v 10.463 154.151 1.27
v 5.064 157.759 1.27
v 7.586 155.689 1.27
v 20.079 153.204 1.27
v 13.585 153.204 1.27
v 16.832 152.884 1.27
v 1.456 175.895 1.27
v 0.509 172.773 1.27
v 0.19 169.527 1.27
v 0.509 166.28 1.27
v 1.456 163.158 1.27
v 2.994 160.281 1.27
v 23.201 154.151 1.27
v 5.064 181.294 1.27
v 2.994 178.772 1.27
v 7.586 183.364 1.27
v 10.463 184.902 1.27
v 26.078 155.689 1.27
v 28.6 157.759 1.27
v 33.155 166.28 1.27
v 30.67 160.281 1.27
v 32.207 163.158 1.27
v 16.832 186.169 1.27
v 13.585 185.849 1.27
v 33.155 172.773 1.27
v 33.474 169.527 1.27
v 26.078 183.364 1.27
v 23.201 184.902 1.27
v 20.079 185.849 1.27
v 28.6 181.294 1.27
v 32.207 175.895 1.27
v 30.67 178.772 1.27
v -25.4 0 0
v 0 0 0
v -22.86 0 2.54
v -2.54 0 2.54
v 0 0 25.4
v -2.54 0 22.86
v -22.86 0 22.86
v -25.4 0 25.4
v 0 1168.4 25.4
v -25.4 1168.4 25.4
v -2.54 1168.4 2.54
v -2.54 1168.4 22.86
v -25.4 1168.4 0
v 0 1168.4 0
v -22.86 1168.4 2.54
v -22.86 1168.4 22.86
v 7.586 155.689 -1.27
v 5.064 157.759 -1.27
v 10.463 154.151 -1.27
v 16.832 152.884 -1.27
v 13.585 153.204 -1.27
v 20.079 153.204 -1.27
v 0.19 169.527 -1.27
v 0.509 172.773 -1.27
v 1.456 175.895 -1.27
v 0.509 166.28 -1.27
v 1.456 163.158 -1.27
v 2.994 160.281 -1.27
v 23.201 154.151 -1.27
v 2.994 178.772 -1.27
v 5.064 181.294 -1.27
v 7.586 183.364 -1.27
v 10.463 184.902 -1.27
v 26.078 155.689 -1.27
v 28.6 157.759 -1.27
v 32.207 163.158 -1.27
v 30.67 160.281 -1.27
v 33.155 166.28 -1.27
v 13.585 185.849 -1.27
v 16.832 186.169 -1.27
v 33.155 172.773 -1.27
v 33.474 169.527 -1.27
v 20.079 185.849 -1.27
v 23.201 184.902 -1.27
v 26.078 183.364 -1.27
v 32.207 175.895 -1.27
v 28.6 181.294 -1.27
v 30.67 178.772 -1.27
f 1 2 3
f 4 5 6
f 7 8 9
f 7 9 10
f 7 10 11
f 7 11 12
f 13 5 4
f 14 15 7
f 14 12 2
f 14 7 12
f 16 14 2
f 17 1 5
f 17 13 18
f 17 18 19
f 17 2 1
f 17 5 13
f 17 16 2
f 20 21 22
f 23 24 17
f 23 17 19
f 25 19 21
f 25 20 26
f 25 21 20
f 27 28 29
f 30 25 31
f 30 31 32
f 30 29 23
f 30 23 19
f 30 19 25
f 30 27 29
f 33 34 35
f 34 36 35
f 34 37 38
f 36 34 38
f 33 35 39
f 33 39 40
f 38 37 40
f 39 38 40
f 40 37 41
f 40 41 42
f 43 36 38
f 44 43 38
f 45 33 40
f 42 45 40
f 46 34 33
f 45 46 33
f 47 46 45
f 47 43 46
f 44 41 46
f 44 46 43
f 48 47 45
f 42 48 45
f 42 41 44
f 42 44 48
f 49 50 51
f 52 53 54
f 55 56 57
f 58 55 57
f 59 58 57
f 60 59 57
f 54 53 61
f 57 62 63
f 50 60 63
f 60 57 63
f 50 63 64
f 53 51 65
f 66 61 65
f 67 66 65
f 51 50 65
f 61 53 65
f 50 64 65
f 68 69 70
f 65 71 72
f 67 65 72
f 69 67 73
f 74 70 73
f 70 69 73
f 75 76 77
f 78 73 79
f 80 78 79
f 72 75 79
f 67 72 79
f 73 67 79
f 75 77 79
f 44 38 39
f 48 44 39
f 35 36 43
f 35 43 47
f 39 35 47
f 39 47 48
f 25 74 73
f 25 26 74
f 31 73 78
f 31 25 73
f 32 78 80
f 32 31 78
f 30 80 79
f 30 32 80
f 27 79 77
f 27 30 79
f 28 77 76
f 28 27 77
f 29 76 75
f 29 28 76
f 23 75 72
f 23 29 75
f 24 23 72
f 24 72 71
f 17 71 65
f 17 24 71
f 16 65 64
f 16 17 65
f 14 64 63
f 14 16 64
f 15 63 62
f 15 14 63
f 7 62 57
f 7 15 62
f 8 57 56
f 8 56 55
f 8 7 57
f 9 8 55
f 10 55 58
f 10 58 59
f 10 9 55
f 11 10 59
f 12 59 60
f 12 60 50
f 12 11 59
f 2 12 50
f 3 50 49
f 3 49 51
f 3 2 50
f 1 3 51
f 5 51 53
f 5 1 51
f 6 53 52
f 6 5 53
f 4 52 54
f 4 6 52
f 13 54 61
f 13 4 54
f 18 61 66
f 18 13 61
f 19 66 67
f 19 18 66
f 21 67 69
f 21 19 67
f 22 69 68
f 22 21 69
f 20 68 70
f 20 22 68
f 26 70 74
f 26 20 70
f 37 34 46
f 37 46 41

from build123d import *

# Parameters (mm, degrees)
SKETCH1_W                 = 25.4
SKETCH1_H                 = 25.4
SKETCH1_W_2               = 20.32
SKETCH1_H_2               = 20.32
EXTRUSION_1X1X0_1_1_DEPTH = 1168.4
SKETCH3_R                 = 16.642304713
BOSS_EXTRUDE1_DEPTH       = 1.27


with BuildPart() as part:
    # Sketch1 → Extrusion 1X1X0.1(1) (new body)
    with BuildSketch(Plane(origin=(0, 0, 0), x_dir=(-1, 0, 0), z_dir=(0, 1, 0))):
        with Locations((12.7, 12.7)):
            Rectangle(SKETCH1_W, SKETCH1_H)
        with Locations((12.7, 12.7)):
            Rectangle(SKETCH1_W_2, SKETCH1_H_2, mode=Mode.SUBTRACT)
    extrude(amount=EXTRUSION_1X1X0_1_1_DEPTH)


with BuildPart() as body_2:
    # Sketch3 → Boss-Extrude1 (new, symmetric)
    with BuildSketch(Plane(origin=(0, -24.723733652, 0), x_dir=(1, 0, 0), z_dir=(0, 0, 1))):
        with Locations((16.831979456, 194.250250367)):
            Circle(SKETCH3_R)
    extrude(amount=BOSS_EXTRUDE1_DEPTH, both=True)


solid = Compound([part.part, body_2.part])
